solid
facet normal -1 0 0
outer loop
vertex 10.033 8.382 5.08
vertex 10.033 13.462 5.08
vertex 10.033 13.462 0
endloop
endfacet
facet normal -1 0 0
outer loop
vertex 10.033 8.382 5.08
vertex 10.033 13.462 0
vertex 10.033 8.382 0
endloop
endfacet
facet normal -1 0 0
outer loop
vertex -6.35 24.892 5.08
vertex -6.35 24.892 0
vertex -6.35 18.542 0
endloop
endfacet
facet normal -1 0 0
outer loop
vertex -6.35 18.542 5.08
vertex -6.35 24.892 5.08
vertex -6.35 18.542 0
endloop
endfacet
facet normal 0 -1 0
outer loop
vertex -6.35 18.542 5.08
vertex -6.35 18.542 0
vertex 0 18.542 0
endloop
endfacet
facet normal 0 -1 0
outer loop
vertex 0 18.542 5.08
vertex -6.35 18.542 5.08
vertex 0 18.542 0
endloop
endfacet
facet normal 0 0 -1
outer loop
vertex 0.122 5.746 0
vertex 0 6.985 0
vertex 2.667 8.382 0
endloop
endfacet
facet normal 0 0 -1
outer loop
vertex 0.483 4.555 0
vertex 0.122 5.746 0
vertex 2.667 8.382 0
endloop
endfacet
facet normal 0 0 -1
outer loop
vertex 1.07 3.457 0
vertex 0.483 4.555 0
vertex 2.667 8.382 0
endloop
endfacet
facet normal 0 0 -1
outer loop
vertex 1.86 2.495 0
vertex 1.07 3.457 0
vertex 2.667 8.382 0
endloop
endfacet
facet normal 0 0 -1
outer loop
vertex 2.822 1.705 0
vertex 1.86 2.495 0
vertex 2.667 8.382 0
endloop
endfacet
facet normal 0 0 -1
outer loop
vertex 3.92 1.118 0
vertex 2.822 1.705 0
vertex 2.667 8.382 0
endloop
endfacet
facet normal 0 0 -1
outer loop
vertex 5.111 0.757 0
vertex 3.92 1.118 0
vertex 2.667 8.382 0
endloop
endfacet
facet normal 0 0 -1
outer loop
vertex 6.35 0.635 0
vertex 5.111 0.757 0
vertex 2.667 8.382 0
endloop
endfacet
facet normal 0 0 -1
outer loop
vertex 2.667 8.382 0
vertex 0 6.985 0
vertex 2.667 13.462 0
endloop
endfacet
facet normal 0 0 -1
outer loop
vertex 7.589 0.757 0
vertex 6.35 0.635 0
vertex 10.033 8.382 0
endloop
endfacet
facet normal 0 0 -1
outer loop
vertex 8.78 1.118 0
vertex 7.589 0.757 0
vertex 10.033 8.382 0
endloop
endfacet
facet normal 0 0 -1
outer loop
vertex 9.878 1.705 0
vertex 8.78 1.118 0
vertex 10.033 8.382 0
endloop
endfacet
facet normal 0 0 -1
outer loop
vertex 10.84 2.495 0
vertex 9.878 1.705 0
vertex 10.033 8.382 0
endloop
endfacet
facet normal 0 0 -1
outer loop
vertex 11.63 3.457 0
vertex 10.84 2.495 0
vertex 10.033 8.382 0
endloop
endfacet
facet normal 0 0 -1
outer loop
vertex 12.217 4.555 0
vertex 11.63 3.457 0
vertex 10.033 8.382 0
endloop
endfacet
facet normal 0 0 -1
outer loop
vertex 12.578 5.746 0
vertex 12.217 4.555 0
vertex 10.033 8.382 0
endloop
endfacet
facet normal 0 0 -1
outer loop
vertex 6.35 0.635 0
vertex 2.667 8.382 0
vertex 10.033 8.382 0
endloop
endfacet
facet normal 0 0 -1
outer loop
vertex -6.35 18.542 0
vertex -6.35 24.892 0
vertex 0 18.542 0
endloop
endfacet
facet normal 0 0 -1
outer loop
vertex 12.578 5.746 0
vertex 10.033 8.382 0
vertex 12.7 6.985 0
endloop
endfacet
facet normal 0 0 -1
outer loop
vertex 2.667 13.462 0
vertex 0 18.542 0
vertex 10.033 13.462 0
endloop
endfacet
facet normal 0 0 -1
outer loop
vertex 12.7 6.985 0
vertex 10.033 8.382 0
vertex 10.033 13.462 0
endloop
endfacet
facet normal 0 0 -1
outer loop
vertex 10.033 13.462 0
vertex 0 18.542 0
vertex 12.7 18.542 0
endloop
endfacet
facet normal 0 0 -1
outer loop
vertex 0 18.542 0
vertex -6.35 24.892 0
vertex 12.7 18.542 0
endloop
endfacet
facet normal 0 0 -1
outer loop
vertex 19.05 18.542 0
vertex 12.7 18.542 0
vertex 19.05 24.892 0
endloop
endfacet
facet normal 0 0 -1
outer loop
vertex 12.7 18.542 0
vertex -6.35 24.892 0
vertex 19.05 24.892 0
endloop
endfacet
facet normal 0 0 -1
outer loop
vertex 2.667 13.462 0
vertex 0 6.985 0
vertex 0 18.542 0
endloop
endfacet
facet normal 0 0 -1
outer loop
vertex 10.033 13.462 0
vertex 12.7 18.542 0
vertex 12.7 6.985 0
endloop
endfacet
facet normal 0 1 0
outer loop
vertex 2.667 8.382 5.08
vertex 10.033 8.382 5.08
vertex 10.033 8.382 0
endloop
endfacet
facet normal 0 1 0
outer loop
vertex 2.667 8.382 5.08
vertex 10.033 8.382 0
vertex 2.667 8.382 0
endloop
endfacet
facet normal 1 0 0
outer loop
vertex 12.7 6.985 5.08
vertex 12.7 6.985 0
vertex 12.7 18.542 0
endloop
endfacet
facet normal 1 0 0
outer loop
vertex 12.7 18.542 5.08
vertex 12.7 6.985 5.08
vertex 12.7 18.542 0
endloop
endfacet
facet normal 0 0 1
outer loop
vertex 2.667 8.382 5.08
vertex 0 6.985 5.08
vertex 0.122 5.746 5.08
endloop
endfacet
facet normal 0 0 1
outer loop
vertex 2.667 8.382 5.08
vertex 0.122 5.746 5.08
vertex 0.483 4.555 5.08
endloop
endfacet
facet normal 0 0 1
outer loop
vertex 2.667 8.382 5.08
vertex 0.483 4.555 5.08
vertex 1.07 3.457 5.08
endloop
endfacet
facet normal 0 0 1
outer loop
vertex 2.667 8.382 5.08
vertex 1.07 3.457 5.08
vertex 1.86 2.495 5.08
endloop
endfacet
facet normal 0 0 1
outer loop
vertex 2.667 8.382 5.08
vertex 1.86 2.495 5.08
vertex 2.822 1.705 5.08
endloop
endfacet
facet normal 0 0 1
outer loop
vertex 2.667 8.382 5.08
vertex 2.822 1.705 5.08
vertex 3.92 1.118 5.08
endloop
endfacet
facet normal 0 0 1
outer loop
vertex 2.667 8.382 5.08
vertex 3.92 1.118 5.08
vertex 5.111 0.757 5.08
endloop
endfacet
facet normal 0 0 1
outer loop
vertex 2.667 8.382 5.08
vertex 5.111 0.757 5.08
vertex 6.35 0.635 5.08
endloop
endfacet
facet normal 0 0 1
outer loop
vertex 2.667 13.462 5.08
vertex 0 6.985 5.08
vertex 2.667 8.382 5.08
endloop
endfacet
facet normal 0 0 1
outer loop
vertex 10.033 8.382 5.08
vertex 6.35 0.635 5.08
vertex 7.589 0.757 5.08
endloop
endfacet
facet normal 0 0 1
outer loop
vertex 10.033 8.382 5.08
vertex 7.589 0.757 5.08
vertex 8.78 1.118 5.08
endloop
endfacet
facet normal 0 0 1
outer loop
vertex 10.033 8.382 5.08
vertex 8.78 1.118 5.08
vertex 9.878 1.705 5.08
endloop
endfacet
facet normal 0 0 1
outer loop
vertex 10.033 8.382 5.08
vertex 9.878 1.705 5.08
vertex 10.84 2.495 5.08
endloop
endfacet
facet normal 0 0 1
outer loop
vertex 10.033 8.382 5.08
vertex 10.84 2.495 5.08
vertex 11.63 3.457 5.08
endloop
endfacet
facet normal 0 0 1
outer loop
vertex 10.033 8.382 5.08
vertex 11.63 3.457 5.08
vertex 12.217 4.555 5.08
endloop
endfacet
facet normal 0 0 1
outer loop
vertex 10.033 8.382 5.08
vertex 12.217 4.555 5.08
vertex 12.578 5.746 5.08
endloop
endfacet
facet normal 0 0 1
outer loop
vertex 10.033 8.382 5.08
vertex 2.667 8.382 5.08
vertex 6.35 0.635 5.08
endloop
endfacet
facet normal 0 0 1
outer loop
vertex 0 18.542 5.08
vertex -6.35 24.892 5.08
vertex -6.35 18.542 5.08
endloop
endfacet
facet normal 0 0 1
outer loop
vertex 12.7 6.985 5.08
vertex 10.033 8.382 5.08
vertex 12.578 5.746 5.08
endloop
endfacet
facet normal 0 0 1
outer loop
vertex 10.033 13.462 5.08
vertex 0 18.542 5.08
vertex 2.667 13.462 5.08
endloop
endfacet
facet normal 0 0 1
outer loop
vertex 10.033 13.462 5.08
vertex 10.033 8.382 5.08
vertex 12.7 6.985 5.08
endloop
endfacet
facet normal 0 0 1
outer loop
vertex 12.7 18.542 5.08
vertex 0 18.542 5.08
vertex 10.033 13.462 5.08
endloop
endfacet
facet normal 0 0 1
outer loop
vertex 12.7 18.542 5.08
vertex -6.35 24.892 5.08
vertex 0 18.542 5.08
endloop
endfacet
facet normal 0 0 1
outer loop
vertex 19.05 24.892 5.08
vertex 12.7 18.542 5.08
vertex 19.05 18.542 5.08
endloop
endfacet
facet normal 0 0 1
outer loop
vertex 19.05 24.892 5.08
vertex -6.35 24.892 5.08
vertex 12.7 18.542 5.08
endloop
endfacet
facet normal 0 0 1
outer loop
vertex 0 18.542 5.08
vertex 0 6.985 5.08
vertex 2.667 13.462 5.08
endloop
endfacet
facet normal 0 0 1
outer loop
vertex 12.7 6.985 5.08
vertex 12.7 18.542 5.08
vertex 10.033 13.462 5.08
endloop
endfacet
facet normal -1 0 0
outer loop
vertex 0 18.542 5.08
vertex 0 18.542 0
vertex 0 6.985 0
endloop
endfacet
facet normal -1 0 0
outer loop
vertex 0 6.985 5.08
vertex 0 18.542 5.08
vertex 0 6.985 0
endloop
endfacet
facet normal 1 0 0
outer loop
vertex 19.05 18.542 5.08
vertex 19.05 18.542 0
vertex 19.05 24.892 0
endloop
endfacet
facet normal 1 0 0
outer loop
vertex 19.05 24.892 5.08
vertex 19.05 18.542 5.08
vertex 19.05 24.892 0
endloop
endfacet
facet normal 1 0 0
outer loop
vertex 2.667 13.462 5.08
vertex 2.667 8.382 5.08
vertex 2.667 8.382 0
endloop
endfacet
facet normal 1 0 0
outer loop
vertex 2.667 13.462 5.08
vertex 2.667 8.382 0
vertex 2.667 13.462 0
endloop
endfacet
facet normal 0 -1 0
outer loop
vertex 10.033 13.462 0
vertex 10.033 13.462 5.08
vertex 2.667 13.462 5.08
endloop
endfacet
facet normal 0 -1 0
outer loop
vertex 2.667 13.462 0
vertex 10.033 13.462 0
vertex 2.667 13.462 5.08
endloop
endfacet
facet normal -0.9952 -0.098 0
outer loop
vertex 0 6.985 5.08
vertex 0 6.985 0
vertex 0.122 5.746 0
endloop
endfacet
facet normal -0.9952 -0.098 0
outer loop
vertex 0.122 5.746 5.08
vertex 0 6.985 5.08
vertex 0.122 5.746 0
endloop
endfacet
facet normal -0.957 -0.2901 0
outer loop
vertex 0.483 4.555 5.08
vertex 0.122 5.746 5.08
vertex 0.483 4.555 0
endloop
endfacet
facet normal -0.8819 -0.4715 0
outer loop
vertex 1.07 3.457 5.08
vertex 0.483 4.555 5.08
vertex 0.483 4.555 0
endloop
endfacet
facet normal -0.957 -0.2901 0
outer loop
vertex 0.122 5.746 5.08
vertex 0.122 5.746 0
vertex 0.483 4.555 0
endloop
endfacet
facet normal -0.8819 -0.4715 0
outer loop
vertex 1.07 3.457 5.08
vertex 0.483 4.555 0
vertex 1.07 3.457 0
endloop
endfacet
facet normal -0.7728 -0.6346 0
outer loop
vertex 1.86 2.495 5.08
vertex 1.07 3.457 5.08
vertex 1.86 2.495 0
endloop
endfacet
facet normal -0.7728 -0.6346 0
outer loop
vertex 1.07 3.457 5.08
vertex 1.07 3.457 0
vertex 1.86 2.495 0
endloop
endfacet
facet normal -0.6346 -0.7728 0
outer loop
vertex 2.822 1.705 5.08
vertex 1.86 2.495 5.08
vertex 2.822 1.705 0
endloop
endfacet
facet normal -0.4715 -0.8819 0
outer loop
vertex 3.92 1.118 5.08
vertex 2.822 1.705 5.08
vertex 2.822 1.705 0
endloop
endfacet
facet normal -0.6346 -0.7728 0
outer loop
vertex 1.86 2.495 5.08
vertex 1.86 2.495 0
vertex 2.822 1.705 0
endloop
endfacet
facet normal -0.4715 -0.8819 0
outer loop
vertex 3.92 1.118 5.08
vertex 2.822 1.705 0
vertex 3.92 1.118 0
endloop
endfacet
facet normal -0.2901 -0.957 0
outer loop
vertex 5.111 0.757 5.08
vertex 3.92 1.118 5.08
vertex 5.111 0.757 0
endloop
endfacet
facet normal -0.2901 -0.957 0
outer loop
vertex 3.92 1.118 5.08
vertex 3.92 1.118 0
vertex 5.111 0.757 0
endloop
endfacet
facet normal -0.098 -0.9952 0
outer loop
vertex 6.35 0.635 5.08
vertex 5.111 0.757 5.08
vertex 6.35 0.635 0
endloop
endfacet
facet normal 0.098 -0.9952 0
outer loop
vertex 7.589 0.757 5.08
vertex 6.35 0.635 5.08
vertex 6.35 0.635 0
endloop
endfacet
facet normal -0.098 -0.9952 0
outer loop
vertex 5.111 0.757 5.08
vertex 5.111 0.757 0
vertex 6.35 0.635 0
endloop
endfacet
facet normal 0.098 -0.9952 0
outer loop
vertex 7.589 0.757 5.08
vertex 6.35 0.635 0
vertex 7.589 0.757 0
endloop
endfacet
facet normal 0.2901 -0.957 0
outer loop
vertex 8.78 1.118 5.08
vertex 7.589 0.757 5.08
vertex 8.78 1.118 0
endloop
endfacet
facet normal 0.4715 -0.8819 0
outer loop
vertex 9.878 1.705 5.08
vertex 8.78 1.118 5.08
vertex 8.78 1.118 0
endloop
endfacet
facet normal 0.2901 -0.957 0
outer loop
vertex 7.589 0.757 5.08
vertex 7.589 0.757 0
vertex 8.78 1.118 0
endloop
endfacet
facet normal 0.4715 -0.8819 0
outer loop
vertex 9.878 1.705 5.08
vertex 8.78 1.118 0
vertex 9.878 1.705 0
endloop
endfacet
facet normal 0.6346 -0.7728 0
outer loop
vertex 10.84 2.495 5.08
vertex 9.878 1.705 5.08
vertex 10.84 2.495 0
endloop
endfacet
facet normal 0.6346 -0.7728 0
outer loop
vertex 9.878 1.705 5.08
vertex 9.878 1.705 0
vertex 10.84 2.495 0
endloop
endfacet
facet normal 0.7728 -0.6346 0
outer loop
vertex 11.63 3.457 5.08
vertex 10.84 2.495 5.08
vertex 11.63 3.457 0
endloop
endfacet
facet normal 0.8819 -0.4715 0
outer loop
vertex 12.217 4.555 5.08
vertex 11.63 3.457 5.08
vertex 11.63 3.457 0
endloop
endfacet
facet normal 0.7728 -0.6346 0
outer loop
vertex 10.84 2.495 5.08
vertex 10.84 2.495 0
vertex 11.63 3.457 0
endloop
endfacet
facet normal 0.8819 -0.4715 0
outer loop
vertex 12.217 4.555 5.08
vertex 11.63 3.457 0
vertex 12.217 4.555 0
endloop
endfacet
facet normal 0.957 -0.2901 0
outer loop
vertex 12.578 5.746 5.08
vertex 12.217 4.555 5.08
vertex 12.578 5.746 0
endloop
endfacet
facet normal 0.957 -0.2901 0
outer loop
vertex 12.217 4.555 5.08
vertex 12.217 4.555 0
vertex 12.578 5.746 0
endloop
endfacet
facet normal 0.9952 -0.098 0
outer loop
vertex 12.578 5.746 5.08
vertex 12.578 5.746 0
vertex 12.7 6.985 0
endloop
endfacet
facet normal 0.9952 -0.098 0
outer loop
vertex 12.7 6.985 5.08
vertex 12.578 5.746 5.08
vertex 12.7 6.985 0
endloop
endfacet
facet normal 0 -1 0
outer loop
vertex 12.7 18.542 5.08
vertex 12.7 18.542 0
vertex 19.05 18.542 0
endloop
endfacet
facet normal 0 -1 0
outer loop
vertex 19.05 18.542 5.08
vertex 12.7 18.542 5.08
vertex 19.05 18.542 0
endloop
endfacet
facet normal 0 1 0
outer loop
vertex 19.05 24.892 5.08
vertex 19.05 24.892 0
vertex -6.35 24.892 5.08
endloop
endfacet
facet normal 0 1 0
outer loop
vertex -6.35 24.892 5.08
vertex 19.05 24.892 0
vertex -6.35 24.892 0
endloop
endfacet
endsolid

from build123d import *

# Parameters (mm, degrees)
BOSS_EXTRUDE1_DEPTH = 5.08
CUT_EXTRUDE1_DEPTH  = 32.75406374


with BuildPart() as part:
    # Sketch1 → Boss-Extrude1 (new body)
    with BuildSketch(Plane.XY):
        with BuildLine():
            Line((12.7, 18.542), (19.05, 18.542))
            Line((19.05, 18.542), (19.05, 24.892))
            Line((19.05, 24.892), (-6.35, 24.892))
            Line((-6.35, 24.892), (-6.35, 18.542))
            Line((-6.35, 18.542), (0, 18.542))
            Line((0, 18.542), (0, 6.985))
            ThreePointArc((0, 6.985), (6.35, 0.635), (12.7, 6.985))
            Line((12.7, 6.985), (12.7, 18.542))
        make_face()
    extrude(amount=BOSS_EXTRUDE1_DEPTH)

    # Sketch2 → Cut-Extrude1 (cut, through all)
    with BuildSketch(Plane.XY.offset(5.08)):
        Polygon((6.35, 13.462), (10.033, 13.462), (10.033, 8.382), (2.667, 8.382), (2.667, 13.462), align=None)
    extrude(amount=-CUT_EXTRUDE1_DEPTH, mode=Mode.SUBTRACT)


solid = part.part
